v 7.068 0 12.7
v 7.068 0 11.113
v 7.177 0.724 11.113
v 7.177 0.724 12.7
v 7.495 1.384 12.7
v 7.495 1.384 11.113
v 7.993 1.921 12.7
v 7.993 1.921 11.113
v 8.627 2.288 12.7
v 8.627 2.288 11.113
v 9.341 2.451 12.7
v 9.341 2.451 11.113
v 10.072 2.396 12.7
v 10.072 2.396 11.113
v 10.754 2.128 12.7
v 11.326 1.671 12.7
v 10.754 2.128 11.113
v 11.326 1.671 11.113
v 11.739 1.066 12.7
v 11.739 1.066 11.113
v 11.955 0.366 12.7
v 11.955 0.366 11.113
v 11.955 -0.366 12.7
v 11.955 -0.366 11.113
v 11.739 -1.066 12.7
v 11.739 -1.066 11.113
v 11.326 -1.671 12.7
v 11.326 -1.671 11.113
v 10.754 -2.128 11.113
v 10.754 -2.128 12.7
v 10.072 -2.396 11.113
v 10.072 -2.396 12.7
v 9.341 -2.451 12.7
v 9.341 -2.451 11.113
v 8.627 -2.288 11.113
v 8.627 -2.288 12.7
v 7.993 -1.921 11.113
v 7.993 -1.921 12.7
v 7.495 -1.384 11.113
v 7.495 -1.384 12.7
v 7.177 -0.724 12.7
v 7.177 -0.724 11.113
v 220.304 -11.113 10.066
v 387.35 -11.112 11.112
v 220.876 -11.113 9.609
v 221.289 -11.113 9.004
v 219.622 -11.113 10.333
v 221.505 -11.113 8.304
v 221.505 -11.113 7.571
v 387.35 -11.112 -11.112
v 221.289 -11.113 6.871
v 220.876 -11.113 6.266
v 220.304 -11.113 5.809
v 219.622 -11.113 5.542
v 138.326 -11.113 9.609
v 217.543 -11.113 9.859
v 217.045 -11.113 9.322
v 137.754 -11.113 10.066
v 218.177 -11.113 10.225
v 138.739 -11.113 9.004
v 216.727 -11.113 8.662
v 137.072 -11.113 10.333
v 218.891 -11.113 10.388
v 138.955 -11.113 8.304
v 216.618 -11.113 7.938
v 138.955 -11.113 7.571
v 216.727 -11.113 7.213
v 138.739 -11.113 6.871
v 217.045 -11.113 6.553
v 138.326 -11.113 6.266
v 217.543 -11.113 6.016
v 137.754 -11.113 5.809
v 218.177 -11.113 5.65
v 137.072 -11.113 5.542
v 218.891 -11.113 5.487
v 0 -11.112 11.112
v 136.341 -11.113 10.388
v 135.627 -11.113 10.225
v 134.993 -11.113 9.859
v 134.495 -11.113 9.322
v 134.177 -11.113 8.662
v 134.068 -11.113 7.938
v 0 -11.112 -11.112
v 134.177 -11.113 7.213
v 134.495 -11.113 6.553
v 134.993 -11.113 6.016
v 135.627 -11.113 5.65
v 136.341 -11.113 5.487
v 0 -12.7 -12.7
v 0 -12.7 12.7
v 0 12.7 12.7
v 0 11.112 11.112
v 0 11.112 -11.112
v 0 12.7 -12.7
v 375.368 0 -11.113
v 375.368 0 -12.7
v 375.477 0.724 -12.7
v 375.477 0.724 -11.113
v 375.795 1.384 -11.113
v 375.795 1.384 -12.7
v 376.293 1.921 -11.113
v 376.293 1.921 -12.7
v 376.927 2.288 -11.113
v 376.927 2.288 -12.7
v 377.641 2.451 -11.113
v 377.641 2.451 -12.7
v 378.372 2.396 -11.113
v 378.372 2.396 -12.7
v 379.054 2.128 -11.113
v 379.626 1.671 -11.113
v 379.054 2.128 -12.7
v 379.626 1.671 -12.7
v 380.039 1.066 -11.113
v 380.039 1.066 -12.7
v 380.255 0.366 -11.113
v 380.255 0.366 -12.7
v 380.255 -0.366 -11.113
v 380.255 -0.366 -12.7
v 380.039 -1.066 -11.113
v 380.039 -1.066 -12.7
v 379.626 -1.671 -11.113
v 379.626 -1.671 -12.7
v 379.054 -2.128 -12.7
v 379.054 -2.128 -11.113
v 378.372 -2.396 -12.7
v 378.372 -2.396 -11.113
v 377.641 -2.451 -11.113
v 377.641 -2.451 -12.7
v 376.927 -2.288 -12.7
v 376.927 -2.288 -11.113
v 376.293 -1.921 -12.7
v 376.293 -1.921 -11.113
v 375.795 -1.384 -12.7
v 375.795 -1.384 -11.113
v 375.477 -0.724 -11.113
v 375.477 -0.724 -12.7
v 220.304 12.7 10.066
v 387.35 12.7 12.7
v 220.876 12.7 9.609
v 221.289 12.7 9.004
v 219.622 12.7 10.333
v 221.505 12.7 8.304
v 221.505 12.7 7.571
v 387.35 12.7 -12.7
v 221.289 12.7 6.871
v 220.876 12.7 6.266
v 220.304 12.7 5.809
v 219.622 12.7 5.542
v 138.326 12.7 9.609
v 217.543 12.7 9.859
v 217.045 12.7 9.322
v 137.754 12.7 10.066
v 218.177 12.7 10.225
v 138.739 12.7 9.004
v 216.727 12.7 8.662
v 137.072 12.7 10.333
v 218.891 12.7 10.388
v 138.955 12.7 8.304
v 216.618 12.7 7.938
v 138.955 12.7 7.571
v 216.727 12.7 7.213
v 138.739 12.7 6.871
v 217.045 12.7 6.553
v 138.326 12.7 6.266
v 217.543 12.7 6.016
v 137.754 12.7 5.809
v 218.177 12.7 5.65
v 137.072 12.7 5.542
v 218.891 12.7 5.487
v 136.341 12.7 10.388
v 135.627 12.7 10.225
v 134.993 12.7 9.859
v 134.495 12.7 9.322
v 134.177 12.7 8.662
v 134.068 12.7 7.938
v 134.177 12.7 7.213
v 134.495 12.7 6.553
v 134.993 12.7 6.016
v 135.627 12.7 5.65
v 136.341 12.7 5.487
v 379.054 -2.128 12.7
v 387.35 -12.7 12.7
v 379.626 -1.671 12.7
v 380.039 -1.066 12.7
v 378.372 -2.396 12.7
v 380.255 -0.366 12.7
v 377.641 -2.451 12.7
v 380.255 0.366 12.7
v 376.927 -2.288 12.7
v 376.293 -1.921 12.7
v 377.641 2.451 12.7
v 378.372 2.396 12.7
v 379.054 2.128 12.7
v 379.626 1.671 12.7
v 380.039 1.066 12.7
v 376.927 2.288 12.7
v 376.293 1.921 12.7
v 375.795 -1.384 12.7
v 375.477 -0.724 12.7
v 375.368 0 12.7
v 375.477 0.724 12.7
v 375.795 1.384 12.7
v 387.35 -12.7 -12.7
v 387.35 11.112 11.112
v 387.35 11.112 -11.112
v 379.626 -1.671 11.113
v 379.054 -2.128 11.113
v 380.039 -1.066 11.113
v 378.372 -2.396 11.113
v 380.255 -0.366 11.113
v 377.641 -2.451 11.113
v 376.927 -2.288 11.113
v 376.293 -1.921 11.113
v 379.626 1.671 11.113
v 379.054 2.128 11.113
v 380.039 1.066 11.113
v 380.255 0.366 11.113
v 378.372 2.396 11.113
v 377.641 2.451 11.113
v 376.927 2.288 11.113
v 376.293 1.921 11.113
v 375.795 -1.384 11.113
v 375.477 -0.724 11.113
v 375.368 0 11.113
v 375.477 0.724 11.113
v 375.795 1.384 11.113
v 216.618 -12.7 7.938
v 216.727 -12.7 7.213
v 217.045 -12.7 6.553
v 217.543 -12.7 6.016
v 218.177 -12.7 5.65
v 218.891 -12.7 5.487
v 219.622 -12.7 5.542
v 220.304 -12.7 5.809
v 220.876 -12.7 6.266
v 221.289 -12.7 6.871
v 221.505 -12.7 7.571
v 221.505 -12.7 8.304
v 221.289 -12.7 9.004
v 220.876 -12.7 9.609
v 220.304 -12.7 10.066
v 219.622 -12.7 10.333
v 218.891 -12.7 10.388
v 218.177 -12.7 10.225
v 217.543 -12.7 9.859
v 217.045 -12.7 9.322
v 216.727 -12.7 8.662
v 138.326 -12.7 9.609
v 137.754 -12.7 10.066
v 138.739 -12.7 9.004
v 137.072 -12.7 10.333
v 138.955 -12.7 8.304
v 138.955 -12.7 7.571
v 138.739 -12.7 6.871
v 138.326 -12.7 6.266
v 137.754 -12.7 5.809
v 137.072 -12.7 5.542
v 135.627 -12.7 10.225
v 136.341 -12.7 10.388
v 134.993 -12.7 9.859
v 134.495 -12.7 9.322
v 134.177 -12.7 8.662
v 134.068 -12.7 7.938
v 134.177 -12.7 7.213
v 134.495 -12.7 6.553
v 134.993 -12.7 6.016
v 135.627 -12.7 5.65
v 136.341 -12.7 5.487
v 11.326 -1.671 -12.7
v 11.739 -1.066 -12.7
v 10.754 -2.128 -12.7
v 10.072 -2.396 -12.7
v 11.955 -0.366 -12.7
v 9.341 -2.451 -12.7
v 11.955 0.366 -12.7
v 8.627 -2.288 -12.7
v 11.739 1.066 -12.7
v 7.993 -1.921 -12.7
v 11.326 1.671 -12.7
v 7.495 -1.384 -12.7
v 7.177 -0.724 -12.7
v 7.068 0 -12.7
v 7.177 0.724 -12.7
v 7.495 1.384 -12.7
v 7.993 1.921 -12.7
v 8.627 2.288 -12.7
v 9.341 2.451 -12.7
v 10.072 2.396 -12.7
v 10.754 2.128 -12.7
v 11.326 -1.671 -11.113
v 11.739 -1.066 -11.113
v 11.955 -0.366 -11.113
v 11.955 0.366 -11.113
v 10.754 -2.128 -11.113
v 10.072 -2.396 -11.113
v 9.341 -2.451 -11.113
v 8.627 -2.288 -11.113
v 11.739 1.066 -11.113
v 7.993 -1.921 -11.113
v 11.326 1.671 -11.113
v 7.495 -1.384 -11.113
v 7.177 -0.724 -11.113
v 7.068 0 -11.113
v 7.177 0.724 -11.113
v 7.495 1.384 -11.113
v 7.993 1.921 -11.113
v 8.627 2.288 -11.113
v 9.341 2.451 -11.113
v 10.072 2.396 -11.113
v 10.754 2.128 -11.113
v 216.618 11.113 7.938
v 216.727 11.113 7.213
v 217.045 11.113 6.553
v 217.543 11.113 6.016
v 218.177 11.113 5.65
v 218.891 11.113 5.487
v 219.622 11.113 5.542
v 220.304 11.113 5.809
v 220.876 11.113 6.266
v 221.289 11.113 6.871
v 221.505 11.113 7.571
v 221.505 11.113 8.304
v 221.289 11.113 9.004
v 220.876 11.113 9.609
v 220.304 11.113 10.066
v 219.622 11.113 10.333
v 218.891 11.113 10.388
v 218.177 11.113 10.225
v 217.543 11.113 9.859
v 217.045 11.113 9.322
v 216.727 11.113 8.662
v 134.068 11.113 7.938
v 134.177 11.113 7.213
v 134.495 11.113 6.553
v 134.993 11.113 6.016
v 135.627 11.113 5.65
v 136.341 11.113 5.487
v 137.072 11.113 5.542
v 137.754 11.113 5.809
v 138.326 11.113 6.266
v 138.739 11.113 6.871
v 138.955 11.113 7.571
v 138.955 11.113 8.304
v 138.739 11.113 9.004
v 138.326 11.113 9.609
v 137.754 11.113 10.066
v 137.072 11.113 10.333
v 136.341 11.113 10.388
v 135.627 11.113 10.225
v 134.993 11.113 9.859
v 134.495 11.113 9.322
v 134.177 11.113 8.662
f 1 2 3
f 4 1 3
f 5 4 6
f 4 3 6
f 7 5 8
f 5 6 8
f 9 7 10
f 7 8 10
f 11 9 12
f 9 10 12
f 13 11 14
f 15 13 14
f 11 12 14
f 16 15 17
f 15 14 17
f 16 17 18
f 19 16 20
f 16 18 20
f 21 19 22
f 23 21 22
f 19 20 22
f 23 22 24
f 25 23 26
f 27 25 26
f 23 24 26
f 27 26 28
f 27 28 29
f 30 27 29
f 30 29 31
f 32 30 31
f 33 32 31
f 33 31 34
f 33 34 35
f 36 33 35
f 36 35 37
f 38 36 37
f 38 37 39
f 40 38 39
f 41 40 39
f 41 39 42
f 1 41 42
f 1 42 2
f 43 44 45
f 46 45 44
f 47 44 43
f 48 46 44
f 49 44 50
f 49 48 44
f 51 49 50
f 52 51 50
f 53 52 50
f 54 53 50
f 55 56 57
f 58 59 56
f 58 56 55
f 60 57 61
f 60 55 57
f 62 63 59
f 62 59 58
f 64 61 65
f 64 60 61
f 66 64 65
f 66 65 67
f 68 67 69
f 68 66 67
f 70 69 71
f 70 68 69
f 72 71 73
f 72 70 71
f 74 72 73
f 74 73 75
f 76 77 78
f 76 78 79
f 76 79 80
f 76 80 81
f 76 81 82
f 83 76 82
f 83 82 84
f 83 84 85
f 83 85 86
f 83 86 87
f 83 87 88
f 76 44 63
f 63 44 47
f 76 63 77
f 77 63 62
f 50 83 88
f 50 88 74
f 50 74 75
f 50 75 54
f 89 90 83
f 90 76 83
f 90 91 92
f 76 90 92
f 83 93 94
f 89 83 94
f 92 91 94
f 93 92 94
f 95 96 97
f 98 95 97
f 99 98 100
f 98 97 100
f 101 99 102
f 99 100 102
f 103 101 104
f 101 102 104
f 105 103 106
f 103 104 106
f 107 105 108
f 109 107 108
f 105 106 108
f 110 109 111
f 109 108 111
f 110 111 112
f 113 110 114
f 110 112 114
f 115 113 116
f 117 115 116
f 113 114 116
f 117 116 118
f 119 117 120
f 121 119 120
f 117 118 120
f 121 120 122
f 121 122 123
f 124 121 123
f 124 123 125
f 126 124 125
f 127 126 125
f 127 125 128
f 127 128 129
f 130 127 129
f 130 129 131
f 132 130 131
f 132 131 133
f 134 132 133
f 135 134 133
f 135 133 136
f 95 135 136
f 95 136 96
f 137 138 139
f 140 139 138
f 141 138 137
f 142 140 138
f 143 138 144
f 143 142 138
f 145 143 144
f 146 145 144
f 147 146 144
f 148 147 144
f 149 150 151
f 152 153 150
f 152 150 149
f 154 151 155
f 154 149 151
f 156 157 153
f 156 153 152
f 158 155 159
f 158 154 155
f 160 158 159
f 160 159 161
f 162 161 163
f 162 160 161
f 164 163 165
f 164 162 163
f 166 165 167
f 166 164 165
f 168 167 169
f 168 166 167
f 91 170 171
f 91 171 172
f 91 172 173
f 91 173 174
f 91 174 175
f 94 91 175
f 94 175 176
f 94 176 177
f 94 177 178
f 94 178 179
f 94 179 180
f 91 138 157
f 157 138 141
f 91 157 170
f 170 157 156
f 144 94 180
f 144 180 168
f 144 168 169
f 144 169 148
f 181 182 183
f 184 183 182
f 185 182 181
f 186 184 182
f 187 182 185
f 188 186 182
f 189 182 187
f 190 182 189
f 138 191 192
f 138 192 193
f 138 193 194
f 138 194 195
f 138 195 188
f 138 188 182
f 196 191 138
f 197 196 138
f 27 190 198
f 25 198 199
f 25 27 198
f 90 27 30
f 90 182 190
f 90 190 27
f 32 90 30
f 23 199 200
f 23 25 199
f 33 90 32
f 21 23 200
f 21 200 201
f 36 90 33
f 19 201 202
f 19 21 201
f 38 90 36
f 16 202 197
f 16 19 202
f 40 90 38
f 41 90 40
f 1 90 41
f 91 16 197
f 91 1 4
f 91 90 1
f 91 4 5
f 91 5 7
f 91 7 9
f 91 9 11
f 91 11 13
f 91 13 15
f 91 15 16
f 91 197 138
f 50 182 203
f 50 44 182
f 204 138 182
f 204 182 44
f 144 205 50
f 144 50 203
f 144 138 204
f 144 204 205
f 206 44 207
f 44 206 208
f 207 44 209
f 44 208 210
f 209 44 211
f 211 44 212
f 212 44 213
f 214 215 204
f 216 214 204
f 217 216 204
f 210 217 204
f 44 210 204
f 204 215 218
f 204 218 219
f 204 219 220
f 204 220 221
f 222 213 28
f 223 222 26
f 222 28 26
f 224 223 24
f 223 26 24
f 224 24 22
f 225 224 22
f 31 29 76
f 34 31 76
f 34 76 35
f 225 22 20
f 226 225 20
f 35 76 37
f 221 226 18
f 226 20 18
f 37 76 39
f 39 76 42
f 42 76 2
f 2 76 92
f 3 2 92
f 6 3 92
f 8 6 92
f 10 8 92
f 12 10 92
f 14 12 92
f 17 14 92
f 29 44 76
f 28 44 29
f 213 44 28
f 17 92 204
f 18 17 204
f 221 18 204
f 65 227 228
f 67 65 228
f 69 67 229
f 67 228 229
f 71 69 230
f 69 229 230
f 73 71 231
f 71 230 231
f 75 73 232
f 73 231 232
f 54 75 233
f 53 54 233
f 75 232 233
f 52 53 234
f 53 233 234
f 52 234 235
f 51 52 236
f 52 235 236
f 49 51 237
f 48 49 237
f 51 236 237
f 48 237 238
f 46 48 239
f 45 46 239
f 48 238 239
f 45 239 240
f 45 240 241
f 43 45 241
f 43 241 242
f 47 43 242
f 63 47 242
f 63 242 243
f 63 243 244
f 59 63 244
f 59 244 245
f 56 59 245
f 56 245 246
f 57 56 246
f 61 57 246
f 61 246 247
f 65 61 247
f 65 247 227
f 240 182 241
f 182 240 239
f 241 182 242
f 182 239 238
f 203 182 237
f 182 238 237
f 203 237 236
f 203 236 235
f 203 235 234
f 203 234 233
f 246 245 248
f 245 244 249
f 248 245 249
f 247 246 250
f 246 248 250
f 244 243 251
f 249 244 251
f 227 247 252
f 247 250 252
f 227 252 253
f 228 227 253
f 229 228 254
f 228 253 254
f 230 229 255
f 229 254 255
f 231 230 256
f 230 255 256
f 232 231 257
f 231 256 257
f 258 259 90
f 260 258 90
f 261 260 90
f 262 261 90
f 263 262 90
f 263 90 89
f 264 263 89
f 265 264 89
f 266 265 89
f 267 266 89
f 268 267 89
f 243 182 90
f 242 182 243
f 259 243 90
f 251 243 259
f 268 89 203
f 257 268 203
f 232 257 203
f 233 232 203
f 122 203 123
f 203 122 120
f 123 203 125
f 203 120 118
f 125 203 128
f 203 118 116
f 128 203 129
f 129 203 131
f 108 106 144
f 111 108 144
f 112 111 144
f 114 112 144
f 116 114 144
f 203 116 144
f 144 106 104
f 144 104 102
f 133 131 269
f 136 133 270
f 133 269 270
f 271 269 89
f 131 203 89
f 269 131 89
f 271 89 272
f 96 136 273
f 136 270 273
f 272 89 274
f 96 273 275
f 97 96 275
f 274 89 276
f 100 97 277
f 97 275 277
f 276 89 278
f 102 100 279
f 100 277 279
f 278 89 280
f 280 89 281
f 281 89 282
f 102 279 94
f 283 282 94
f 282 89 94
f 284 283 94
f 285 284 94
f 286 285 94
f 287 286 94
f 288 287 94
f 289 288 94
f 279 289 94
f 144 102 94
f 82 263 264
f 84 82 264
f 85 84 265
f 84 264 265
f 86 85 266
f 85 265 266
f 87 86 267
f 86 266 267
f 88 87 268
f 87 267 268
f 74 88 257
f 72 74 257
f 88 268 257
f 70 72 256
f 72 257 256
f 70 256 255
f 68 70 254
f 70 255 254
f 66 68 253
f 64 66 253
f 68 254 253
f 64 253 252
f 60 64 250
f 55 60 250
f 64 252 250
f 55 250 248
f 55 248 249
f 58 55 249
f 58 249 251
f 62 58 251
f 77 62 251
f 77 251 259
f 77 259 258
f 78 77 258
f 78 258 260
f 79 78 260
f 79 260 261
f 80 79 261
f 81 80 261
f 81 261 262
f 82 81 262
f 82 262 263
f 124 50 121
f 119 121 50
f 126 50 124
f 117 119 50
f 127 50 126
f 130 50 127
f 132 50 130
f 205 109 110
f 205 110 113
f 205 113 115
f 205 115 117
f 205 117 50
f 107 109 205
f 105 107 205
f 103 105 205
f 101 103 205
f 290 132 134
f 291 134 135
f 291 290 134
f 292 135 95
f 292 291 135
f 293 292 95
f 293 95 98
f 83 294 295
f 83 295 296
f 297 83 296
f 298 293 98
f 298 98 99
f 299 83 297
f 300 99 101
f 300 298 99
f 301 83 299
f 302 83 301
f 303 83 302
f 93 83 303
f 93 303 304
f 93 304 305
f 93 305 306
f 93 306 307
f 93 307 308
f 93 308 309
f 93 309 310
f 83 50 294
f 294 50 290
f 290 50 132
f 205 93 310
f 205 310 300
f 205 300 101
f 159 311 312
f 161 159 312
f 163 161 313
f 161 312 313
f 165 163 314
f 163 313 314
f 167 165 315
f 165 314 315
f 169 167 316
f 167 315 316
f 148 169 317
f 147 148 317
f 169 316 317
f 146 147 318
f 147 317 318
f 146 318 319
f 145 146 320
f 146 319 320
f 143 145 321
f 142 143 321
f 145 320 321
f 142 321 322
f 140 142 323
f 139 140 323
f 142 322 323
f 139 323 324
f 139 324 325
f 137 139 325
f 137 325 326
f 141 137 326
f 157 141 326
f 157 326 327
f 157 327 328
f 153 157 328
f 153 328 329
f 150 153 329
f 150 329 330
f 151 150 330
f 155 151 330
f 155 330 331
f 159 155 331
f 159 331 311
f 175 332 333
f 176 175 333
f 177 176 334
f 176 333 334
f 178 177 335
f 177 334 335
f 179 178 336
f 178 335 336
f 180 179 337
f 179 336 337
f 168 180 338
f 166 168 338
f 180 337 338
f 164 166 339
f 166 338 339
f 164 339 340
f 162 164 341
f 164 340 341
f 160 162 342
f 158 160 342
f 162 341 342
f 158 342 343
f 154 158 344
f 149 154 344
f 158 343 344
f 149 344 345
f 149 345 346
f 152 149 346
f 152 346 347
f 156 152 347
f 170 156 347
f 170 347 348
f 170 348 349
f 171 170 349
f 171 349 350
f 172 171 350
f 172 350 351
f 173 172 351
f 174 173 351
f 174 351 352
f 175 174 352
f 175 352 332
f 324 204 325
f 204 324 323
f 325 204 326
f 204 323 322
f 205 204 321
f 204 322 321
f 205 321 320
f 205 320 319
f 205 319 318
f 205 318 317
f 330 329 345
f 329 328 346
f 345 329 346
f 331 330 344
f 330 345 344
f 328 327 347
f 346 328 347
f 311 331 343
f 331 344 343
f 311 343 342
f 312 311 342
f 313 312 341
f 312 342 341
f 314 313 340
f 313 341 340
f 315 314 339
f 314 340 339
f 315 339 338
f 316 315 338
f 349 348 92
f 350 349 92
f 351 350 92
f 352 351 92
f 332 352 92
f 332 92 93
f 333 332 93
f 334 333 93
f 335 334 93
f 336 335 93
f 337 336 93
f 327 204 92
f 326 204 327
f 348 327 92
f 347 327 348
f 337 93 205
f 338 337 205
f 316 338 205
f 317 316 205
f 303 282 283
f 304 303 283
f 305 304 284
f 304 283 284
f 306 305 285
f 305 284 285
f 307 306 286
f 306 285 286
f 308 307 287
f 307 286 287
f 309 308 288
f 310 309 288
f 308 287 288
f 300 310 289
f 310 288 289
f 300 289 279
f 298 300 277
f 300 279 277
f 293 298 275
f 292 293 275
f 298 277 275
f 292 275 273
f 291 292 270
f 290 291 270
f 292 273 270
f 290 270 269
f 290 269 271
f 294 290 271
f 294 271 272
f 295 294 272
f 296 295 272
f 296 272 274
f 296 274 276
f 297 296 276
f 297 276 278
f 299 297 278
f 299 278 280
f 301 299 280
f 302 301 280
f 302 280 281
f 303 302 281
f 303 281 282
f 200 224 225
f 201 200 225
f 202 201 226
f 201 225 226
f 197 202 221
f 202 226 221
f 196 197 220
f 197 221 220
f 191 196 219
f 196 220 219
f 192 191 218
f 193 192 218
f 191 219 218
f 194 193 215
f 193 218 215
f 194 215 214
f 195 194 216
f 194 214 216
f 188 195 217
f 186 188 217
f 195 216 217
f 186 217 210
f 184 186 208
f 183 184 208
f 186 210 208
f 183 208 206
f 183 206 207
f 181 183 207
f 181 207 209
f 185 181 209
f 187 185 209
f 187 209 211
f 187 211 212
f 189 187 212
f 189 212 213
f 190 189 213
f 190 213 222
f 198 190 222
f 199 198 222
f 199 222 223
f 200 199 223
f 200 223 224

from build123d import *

# Parameters (mm, degrees)
SKETCH1_W                    = 25.4
SKETCH1_H                    = 25.4
SKETCH1_W_2                  = 22.225
SKETCH1_H_2                  = 22.225
EXTRUDE_THIN1_DEPTH          = 387.35
F_10_0_1935_DIAMETER_HOLE1_D = 4.9149
F_10_0_1935_DIAMETER_HOLE2_D = 4.9149


with BuildPart() as part:
    # Sketch1 → Extrude-Thin1 (new body)
    with BuildSketch(Plane(origin=(0, 0, 0), x_dir=(0, 0, -1), z_dir=(1, 0, 0))):
        Rectangle(SKETCH1_W, SKETCH1_H)
        Rectangle(SKETCH1_W_2, SKETCH1_H_2, mode=Mode.SUBTRACT)
    extrude(amount=EXTRUDE_THIN1_DEPTH)

    # #10 (0.1935) Diameter Hole1 (through all)
    with Locations(Plane.XY.offset(12.7)):
        with Locations((9.525, 0), (377.825, 0)):
            Hole(F_10_0_1935_DIAMETER_HOLE1_D / 2)

    # #10 (0.1935) Diameter Hole2 (through all)
    with Locations(Plane(origin=(0, 12.7, 0), x_dir=(1, 0, 0), z_dir=(0, 1, 0))):
        with Locations((136.525, -7.9375), (219.075, -7.9375)):
            Hole(F_10_0_1935_DIAMETER_HOLE2_D / 2)


solid = part.part
